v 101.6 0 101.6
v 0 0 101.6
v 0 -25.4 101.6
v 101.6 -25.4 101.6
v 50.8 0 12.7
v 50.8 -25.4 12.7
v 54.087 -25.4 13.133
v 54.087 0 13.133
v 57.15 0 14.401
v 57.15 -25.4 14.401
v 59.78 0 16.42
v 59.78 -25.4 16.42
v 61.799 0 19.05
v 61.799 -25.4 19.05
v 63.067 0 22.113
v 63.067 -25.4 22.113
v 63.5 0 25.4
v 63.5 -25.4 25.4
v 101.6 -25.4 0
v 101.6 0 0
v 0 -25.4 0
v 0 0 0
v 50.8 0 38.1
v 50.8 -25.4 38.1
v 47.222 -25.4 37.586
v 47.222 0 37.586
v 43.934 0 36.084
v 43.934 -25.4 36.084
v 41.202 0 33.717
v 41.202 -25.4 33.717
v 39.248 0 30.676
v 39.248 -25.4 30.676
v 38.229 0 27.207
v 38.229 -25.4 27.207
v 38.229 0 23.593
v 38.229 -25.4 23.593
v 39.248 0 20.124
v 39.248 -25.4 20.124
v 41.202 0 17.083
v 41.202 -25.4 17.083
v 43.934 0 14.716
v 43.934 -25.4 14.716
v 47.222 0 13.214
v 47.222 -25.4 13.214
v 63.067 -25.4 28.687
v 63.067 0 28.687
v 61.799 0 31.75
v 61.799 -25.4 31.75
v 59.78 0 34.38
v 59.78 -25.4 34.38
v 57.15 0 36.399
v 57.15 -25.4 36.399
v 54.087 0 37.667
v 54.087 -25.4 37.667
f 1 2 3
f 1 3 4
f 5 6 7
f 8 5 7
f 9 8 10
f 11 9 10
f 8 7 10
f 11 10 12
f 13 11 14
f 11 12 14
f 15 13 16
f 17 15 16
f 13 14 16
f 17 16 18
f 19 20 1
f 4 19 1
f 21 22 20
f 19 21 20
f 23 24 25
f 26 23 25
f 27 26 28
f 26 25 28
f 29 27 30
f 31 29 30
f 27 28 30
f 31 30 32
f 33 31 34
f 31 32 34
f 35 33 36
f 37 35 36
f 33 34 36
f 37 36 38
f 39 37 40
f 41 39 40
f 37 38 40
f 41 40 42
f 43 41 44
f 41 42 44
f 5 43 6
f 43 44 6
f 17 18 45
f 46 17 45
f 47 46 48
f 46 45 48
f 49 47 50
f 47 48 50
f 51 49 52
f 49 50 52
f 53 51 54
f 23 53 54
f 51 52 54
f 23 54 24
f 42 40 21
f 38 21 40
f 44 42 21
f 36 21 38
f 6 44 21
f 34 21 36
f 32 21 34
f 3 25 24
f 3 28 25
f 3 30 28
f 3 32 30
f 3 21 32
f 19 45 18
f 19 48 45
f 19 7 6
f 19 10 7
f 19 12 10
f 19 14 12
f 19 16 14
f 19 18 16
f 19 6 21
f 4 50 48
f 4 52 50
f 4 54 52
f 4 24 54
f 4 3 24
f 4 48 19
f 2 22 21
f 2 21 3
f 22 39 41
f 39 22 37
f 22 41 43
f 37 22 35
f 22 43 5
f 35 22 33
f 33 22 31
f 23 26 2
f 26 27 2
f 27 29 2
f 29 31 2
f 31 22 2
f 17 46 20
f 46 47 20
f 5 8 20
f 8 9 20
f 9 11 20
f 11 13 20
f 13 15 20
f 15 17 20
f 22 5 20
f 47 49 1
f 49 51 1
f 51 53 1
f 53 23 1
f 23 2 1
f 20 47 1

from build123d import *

# Parameters (mm, degrees)
F0_W     = 101.6
F0_H     = 101.6
F1_DEPTH = 25.4
F3_DEPTH = 25.401


with BuildPart() as f1:
    # F0 (on Front) → F1 (new body)
    with BuildSketch(Plane.XZ):
        with Locations((50.8, 50.8)):
            Rectangle(F0_W, F0_H)
    extrude(amount=F1_DEPTH)

    # F2 (on face) → F3 (cut, through all)
    with BuildSketch(Plane.XZ.offset(25.4)):
        with BuildLine():
            ThreePointArc((63.5, 25.4), (59.780256, 34.380256), (50.8, 38.1))
            Line((50.8, 38.1), (50.8, 12.7))
            ThreePointArc((50.8, 12.7), (59.780256, 16.419744), (63.5, 25.4))
        make_face()
        with BuildLine():
            Line((50.8, 12.7), (50.8, 38.1))
            ThreePointArc((50.8, 38.1), (38.1, 25.4), (50.8, 12.7))
        make_face()
    extrude(amount=-F3_DEPTH, mode=Mode.SUBTRACT)


solid = f1.part
